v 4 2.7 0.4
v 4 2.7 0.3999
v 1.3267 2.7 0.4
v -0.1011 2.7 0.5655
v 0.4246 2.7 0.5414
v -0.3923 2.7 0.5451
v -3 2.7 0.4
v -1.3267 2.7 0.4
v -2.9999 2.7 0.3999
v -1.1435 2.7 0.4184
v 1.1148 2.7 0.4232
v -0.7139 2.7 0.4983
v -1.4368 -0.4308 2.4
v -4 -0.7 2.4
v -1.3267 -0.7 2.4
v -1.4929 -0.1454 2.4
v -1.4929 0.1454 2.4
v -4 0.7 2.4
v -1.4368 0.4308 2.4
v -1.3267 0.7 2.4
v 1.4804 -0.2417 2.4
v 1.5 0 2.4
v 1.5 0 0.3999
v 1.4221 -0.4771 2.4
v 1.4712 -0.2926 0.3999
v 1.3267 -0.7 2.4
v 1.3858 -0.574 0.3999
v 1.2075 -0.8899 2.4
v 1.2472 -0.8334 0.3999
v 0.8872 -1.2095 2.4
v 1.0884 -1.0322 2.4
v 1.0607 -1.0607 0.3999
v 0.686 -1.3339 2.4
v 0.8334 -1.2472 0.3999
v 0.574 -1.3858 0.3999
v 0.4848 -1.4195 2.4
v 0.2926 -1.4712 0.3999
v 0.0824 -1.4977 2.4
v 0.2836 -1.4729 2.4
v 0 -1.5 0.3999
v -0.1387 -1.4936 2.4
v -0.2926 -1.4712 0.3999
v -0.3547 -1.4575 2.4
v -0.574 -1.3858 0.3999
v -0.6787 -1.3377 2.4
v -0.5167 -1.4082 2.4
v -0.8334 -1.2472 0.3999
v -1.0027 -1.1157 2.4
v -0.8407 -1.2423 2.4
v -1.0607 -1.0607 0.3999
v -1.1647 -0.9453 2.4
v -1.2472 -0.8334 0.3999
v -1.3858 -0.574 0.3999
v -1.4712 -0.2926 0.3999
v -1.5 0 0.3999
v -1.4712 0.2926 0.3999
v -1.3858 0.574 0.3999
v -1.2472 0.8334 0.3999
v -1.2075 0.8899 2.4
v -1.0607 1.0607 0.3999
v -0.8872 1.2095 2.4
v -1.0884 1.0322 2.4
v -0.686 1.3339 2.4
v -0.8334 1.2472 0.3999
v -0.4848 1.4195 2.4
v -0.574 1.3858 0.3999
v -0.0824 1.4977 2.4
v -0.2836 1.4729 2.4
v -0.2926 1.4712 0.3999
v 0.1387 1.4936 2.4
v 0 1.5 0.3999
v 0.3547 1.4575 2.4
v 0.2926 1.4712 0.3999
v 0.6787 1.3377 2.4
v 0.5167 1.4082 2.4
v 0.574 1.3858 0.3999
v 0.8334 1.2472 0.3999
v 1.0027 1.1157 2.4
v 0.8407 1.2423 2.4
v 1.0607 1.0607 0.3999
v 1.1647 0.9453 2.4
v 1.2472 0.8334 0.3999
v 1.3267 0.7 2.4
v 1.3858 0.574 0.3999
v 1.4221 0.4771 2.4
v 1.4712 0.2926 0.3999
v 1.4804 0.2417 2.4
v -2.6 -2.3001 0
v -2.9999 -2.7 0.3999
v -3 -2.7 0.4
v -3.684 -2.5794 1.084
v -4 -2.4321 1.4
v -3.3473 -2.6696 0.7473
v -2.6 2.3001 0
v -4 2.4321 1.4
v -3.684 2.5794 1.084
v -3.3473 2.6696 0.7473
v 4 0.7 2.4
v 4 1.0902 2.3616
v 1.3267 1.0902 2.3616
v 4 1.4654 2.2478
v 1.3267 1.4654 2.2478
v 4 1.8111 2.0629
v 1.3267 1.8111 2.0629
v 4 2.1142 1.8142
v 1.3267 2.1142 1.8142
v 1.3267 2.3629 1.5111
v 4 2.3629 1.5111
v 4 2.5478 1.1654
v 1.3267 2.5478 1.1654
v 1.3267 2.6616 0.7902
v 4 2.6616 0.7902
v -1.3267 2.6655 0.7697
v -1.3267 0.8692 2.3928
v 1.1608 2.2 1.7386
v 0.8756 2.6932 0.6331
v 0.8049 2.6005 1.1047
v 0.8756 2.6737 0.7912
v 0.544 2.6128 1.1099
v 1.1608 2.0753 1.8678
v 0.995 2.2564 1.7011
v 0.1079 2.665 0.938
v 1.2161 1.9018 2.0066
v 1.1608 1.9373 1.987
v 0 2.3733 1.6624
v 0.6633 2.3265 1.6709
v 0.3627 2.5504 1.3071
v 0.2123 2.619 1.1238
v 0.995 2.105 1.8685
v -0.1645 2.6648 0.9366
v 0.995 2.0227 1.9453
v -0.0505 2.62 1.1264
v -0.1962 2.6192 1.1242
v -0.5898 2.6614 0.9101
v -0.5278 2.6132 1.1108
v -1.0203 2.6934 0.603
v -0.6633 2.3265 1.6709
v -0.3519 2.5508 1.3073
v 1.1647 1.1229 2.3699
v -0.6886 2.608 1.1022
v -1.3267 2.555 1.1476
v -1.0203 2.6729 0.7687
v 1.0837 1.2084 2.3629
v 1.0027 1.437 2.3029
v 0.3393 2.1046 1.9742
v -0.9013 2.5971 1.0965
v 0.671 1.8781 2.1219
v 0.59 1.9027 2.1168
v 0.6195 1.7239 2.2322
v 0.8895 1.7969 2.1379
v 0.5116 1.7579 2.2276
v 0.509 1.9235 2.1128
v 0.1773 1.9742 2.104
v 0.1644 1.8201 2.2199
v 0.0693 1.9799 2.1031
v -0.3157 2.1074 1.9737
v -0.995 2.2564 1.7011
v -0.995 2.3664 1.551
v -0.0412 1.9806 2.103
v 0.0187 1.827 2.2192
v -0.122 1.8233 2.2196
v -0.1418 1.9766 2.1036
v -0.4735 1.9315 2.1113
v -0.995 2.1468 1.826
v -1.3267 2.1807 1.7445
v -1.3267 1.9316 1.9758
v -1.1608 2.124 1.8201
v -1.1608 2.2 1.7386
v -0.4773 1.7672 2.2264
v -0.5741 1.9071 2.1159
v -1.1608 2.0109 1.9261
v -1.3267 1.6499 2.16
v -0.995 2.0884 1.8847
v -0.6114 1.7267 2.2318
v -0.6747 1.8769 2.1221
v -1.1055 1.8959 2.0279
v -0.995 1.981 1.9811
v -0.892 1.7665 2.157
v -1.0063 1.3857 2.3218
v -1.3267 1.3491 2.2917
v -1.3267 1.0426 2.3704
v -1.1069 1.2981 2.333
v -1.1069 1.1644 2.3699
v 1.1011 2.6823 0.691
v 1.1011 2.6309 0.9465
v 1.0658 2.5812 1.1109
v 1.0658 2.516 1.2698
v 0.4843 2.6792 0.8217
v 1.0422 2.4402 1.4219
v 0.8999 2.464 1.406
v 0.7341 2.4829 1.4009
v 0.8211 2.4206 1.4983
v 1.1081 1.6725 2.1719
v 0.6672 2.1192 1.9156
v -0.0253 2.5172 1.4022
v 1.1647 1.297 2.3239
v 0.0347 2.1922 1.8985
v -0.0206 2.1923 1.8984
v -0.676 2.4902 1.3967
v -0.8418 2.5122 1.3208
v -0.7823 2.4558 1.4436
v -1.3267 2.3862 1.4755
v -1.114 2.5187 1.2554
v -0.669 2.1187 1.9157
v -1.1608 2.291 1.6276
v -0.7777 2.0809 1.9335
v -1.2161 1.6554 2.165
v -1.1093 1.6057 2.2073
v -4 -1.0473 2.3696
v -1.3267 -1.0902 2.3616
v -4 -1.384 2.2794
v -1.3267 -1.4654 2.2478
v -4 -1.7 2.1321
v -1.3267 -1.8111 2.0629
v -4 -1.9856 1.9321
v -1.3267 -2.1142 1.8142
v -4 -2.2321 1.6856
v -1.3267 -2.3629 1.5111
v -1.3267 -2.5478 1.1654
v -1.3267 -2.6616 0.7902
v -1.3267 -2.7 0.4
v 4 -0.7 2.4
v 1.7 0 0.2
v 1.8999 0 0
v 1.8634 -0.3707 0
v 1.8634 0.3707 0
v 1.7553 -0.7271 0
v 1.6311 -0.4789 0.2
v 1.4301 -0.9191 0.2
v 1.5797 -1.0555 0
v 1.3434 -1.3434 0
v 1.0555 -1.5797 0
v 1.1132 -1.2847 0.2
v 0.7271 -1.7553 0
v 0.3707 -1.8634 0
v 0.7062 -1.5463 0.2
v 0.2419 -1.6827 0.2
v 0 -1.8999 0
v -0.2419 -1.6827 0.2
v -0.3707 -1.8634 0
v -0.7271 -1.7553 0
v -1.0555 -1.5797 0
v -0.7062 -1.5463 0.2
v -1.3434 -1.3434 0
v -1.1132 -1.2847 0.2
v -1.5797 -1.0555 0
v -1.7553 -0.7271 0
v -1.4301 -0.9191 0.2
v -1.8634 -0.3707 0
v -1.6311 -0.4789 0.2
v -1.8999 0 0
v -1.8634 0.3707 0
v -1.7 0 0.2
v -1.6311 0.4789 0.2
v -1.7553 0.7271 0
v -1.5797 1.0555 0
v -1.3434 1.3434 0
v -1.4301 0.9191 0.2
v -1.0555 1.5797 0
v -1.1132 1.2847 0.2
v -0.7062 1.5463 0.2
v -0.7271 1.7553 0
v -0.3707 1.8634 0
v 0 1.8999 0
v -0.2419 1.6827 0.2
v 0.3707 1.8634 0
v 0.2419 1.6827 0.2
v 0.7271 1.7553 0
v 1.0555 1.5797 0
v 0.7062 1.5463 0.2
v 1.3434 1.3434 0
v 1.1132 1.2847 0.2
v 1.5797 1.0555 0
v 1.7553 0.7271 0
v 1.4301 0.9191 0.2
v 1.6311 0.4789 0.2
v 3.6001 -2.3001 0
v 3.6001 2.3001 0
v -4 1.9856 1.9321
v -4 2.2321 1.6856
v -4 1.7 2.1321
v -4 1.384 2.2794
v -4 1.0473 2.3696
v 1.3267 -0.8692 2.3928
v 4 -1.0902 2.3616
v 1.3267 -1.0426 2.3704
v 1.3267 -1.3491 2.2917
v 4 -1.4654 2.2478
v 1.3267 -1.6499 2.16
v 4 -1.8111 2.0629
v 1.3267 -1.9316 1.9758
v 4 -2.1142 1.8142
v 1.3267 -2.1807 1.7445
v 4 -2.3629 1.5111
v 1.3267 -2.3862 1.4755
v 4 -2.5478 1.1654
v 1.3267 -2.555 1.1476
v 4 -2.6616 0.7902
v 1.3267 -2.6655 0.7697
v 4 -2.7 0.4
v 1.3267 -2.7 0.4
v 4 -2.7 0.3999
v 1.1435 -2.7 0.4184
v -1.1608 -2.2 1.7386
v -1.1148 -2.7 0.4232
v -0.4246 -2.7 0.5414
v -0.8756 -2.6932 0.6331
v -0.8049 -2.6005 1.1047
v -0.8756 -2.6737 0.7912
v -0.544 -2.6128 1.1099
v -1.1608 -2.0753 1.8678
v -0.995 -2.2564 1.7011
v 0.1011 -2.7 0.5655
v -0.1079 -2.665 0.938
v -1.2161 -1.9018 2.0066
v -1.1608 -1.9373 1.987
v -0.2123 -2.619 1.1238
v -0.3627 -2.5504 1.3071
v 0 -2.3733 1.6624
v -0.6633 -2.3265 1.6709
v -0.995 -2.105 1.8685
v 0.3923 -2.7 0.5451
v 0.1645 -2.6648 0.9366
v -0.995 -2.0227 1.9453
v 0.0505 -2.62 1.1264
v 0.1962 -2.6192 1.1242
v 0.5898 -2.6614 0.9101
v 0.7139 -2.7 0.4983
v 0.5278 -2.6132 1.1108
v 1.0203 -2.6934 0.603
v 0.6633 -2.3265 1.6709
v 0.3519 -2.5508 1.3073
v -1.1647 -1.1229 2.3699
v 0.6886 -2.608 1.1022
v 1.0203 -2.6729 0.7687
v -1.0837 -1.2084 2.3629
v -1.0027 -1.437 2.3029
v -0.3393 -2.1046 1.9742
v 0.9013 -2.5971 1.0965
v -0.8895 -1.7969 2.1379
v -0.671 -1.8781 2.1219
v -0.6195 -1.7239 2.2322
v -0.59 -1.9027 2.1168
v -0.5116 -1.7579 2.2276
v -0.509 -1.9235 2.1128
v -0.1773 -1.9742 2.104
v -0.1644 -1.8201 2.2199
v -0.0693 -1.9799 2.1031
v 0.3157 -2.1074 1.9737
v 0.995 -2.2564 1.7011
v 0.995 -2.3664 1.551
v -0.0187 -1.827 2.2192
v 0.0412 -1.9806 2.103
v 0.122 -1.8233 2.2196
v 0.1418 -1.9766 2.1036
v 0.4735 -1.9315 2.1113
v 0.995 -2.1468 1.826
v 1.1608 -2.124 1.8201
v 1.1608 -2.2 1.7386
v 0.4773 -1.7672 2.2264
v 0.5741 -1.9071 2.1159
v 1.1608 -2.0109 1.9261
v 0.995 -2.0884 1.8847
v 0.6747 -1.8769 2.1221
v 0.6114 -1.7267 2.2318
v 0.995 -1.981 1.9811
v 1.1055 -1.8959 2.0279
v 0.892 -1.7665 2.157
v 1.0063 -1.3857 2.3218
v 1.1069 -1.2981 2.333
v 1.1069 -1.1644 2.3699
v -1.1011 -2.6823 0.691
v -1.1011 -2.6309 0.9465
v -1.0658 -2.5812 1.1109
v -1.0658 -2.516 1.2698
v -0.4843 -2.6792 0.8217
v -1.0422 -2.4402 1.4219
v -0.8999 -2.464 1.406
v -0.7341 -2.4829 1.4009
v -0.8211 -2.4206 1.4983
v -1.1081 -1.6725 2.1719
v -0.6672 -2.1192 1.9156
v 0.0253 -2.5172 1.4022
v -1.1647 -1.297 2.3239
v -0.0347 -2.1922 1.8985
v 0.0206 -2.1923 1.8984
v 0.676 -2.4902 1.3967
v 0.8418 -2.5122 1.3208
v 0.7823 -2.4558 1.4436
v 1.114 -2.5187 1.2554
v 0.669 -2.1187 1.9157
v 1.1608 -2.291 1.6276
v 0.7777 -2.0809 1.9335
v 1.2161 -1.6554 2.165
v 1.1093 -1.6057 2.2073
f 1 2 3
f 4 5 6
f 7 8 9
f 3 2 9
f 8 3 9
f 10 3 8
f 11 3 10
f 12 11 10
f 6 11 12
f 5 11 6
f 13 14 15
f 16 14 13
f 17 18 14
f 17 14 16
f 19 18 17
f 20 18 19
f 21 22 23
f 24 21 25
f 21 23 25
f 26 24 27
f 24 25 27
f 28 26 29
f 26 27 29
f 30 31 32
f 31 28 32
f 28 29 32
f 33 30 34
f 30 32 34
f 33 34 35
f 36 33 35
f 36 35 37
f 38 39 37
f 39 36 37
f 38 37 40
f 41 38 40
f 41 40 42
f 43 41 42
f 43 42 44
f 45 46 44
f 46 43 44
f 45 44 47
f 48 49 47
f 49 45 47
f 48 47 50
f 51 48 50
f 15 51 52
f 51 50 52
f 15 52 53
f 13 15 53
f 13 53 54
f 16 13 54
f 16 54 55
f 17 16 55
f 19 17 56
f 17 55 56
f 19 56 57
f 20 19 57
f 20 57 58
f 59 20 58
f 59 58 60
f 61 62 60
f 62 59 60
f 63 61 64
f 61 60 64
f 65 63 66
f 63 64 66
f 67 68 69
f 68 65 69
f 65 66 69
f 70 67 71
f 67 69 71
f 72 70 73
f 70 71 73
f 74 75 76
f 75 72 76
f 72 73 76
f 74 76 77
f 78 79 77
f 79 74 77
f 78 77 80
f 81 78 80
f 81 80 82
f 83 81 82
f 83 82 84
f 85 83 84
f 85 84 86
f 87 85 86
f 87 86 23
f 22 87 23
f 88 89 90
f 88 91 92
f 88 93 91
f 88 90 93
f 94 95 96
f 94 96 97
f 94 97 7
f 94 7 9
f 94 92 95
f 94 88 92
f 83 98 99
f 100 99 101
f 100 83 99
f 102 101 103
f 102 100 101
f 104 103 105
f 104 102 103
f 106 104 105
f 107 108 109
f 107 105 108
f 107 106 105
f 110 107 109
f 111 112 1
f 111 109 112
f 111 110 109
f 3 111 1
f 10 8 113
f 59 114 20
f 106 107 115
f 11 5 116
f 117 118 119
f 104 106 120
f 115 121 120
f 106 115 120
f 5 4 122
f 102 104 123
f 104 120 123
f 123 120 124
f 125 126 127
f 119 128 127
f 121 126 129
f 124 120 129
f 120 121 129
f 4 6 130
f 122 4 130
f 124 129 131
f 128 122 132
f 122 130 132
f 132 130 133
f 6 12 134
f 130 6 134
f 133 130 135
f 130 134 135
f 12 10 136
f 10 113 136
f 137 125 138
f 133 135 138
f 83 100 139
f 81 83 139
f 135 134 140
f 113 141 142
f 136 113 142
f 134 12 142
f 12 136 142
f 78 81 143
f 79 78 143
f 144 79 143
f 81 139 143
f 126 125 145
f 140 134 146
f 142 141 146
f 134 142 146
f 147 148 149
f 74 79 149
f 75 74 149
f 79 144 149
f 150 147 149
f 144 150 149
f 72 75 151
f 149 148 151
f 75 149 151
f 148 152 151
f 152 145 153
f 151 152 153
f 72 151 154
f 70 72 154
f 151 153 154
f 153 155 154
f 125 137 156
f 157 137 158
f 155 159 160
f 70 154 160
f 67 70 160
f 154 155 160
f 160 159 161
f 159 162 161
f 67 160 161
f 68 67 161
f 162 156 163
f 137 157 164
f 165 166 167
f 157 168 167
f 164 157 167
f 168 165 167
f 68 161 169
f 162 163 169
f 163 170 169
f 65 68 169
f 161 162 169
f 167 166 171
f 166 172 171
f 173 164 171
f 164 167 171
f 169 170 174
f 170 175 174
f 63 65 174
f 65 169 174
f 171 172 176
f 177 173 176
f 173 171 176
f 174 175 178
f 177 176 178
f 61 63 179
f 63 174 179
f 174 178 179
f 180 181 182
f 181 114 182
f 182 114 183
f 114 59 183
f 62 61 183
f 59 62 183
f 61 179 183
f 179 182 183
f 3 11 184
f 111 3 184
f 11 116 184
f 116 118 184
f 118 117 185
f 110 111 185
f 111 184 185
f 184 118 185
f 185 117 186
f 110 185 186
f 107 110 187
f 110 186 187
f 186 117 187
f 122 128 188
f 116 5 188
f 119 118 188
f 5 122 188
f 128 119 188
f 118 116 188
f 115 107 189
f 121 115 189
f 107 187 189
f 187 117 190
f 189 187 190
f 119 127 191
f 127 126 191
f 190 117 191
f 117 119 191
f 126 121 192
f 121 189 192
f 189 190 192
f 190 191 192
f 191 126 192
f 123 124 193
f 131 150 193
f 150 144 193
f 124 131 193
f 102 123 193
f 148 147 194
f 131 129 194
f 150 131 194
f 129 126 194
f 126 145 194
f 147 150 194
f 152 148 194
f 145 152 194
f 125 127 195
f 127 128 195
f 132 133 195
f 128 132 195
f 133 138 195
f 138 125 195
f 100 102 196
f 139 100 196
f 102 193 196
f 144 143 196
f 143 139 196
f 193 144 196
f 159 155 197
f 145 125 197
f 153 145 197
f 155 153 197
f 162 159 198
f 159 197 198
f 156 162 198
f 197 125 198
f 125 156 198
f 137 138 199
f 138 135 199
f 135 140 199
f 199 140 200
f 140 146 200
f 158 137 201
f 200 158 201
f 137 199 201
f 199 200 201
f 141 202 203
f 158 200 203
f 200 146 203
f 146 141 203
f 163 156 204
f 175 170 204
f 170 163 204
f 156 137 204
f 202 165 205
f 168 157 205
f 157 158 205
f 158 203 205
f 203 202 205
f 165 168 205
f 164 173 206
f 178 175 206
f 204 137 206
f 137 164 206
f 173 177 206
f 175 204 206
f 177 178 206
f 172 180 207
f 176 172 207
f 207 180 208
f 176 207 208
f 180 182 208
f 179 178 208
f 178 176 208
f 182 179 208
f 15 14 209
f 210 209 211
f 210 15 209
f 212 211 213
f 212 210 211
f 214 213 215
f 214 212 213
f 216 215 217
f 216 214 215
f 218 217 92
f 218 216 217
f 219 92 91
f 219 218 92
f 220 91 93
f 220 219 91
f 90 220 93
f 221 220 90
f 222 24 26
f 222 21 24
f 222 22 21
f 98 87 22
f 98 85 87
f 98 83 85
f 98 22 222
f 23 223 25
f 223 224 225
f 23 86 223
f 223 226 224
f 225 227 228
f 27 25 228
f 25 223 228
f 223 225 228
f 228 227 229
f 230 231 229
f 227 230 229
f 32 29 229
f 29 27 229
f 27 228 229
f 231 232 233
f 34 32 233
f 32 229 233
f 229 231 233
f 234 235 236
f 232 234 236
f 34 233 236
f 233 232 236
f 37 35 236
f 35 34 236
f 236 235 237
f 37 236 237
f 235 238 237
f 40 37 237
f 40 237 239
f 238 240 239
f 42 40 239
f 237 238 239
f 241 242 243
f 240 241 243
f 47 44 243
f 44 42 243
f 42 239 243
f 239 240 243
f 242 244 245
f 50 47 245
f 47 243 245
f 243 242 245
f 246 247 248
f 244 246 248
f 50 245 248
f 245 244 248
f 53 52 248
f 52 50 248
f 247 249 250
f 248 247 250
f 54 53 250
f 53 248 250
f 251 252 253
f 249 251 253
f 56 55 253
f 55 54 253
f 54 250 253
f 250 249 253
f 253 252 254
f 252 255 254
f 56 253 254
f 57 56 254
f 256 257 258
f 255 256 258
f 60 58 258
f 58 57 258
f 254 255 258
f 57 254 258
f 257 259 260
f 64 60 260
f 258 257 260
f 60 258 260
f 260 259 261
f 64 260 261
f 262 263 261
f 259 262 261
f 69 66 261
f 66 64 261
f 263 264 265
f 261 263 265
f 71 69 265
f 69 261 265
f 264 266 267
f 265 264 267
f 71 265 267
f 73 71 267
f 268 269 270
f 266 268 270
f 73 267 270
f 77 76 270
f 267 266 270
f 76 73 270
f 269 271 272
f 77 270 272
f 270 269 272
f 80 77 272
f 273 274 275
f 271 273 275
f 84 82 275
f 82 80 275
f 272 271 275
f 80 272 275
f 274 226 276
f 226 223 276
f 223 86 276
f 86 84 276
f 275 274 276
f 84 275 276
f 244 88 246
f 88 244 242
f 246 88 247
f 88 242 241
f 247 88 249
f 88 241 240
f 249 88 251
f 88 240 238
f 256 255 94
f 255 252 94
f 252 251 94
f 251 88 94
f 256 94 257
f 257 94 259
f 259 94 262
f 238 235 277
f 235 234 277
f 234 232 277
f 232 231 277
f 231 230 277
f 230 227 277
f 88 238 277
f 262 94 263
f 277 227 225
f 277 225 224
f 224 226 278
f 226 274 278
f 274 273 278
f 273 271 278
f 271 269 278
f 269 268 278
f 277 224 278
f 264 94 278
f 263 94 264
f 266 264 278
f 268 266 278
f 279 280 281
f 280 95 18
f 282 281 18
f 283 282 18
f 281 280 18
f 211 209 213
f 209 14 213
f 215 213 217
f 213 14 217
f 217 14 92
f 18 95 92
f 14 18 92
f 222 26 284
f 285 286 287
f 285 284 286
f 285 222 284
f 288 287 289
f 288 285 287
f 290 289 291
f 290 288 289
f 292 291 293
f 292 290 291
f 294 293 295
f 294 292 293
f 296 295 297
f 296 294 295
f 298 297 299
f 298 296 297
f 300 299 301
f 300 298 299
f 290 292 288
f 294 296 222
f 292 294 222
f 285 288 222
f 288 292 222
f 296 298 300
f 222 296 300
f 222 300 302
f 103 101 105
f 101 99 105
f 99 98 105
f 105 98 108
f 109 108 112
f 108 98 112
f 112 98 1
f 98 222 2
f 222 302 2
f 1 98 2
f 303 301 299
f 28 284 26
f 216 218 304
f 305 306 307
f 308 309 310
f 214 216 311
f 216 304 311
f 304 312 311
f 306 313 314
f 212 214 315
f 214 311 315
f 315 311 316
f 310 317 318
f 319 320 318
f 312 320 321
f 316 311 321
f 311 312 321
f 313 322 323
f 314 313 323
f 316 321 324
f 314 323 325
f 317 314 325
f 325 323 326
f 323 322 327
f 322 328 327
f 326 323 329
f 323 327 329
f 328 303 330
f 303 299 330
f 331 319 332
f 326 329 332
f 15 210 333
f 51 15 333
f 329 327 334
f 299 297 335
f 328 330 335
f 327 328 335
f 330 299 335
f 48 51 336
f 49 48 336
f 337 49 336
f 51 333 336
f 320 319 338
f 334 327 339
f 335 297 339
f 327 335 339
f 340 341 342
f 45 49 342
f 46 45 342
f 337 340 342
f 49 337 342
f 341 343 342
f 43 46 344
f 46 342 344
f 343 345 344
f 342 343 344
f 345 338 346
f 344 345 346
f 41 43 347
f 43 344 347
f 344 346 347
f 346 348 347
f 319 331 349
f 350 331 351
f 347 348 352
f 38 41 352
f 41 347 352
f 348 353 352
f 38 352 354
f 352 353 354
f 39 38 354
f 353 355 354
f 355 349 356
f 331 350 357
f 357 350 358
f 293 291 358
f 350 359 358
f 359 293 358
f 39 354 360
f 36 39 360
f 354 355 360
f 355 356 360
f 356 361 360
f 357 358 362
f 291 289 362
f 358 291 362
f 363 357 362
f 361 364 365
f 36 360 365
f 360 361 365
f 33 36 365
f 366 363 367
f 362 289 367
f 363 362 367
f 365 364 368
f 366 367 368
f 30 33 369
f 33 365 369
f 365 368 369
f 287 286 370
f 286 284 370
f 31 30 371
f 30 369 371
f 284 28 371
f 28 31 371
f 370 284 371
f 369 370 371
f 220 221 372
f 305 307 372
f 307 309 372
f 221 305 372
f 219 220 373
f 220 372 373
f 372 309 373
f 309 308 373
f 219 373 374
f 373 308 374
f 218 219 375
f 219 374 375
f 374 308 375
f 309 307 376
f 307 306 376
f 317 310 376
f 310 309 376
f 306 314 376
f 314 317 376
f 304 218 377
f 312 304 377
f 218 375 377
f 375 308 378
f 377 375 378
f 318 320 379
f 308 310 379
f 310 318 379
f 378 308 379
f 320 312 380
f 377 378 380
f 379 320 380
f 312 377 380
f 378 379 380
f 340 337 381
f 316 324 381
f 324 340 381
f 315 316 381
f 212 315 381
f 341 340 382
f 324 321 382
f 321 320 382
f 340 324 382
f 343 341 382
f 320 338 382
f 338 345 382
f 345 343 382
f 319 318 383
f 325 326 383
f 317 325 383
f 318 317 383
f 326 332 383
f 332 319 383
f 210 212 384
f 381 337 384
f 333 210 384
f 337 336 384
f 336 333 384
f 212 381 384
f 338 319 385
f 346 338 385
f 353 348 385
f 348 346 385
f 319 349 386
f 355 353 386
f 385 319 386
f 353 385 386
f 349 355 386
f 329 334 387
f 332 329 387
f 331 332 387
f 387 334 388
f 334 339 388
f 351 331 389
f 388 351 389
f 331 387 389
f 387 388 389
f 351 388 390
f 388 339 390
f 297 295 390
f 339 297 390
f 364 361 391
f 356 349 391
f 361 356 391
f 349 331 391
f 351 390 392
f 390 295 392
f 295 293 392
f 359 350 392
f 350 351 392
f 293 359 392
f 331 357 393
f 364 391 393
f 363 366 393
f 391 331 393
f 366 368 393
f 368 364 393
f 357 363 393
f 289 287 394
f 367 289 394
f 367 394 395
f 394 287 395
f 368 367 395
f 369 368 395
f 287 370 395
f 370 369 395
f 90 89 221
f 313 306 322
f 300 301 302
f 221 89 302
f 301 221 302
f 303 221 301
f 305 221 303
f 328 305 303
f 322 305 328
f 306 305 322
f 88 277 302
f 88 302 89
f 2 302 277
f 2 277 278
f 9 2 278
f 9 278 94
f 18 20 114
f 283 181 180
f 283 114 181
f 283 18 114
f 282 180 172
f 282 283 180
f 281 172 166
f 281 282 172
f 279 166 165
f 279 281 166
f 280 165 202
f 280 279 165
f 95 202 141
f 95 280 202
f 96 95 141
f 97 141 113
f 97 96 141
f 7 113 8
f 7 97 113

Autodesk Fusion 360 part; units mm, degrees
sketch "Sketch1" plane through (0, 0, 0) normal (0, 0, 1) x (1, 0, 0)
  line L0 (4, 2.7) -> (-4, 2.7)
  line L1 (-4, 2.7) -> (-4, -2.7)
  line L2 (-4, -2.7) -> (4, -2.7)
  line L3 (4, -2.7) -> (4, 2.7)
  line L4 (4, 2.7) -> (-4, -2.7) construction
  line L5 (-4, 2.7) -> (4, -2.7) construction
  circle A0 centre (0, 0) radius 1.5
  dimension "d1" = 5.4
  dimension "d2" = 8
  dimension "d3" = 3
extrude "Extrude1" add sketch "Sketch1" along normal blind 2.4
fillet "Fillet1" radius 2 2 edges at (0, -2.7, 2.4) (0, 2.7, 2.4)
chamfer "Chamfer2" distance 1.4 distance2 1.4 1 edges at (-4, 0, 0) measured on face at (-4, 0.2333, 0.8)
sketch "Sketch2" plane through (0, 0, 0) normal (0, 0, -1) x (1, 0, 0)
  line L0 (-2.6, 2.7) -> (-2.6, -2.7)
  line L1 (-2.6, -2.7) -> (4, -2.7)
  line L2 (4, -2.7) -> (4, 2.7)
  line L3 (4, 2.7) -> (-2.6, 2.7)
  circle A0 centre (0, 0) radius 1.5
  line L4 (0, 2.7) -> (0, -2.7) construction
  line L5 (2.7, -2.7) -> (2.7, 2.7)
  dimension "d12" = 2.7
chamfer "Chamfer3" distance 0.4 angle 45 4 edges at (0.7, -2.7, 0) (4, 0, 0) (0.7, 2.7, 0) (-1.3985, 0.5424, 0)
equation "d12 = ( 5.4 / 2 ) * 1 mm"
